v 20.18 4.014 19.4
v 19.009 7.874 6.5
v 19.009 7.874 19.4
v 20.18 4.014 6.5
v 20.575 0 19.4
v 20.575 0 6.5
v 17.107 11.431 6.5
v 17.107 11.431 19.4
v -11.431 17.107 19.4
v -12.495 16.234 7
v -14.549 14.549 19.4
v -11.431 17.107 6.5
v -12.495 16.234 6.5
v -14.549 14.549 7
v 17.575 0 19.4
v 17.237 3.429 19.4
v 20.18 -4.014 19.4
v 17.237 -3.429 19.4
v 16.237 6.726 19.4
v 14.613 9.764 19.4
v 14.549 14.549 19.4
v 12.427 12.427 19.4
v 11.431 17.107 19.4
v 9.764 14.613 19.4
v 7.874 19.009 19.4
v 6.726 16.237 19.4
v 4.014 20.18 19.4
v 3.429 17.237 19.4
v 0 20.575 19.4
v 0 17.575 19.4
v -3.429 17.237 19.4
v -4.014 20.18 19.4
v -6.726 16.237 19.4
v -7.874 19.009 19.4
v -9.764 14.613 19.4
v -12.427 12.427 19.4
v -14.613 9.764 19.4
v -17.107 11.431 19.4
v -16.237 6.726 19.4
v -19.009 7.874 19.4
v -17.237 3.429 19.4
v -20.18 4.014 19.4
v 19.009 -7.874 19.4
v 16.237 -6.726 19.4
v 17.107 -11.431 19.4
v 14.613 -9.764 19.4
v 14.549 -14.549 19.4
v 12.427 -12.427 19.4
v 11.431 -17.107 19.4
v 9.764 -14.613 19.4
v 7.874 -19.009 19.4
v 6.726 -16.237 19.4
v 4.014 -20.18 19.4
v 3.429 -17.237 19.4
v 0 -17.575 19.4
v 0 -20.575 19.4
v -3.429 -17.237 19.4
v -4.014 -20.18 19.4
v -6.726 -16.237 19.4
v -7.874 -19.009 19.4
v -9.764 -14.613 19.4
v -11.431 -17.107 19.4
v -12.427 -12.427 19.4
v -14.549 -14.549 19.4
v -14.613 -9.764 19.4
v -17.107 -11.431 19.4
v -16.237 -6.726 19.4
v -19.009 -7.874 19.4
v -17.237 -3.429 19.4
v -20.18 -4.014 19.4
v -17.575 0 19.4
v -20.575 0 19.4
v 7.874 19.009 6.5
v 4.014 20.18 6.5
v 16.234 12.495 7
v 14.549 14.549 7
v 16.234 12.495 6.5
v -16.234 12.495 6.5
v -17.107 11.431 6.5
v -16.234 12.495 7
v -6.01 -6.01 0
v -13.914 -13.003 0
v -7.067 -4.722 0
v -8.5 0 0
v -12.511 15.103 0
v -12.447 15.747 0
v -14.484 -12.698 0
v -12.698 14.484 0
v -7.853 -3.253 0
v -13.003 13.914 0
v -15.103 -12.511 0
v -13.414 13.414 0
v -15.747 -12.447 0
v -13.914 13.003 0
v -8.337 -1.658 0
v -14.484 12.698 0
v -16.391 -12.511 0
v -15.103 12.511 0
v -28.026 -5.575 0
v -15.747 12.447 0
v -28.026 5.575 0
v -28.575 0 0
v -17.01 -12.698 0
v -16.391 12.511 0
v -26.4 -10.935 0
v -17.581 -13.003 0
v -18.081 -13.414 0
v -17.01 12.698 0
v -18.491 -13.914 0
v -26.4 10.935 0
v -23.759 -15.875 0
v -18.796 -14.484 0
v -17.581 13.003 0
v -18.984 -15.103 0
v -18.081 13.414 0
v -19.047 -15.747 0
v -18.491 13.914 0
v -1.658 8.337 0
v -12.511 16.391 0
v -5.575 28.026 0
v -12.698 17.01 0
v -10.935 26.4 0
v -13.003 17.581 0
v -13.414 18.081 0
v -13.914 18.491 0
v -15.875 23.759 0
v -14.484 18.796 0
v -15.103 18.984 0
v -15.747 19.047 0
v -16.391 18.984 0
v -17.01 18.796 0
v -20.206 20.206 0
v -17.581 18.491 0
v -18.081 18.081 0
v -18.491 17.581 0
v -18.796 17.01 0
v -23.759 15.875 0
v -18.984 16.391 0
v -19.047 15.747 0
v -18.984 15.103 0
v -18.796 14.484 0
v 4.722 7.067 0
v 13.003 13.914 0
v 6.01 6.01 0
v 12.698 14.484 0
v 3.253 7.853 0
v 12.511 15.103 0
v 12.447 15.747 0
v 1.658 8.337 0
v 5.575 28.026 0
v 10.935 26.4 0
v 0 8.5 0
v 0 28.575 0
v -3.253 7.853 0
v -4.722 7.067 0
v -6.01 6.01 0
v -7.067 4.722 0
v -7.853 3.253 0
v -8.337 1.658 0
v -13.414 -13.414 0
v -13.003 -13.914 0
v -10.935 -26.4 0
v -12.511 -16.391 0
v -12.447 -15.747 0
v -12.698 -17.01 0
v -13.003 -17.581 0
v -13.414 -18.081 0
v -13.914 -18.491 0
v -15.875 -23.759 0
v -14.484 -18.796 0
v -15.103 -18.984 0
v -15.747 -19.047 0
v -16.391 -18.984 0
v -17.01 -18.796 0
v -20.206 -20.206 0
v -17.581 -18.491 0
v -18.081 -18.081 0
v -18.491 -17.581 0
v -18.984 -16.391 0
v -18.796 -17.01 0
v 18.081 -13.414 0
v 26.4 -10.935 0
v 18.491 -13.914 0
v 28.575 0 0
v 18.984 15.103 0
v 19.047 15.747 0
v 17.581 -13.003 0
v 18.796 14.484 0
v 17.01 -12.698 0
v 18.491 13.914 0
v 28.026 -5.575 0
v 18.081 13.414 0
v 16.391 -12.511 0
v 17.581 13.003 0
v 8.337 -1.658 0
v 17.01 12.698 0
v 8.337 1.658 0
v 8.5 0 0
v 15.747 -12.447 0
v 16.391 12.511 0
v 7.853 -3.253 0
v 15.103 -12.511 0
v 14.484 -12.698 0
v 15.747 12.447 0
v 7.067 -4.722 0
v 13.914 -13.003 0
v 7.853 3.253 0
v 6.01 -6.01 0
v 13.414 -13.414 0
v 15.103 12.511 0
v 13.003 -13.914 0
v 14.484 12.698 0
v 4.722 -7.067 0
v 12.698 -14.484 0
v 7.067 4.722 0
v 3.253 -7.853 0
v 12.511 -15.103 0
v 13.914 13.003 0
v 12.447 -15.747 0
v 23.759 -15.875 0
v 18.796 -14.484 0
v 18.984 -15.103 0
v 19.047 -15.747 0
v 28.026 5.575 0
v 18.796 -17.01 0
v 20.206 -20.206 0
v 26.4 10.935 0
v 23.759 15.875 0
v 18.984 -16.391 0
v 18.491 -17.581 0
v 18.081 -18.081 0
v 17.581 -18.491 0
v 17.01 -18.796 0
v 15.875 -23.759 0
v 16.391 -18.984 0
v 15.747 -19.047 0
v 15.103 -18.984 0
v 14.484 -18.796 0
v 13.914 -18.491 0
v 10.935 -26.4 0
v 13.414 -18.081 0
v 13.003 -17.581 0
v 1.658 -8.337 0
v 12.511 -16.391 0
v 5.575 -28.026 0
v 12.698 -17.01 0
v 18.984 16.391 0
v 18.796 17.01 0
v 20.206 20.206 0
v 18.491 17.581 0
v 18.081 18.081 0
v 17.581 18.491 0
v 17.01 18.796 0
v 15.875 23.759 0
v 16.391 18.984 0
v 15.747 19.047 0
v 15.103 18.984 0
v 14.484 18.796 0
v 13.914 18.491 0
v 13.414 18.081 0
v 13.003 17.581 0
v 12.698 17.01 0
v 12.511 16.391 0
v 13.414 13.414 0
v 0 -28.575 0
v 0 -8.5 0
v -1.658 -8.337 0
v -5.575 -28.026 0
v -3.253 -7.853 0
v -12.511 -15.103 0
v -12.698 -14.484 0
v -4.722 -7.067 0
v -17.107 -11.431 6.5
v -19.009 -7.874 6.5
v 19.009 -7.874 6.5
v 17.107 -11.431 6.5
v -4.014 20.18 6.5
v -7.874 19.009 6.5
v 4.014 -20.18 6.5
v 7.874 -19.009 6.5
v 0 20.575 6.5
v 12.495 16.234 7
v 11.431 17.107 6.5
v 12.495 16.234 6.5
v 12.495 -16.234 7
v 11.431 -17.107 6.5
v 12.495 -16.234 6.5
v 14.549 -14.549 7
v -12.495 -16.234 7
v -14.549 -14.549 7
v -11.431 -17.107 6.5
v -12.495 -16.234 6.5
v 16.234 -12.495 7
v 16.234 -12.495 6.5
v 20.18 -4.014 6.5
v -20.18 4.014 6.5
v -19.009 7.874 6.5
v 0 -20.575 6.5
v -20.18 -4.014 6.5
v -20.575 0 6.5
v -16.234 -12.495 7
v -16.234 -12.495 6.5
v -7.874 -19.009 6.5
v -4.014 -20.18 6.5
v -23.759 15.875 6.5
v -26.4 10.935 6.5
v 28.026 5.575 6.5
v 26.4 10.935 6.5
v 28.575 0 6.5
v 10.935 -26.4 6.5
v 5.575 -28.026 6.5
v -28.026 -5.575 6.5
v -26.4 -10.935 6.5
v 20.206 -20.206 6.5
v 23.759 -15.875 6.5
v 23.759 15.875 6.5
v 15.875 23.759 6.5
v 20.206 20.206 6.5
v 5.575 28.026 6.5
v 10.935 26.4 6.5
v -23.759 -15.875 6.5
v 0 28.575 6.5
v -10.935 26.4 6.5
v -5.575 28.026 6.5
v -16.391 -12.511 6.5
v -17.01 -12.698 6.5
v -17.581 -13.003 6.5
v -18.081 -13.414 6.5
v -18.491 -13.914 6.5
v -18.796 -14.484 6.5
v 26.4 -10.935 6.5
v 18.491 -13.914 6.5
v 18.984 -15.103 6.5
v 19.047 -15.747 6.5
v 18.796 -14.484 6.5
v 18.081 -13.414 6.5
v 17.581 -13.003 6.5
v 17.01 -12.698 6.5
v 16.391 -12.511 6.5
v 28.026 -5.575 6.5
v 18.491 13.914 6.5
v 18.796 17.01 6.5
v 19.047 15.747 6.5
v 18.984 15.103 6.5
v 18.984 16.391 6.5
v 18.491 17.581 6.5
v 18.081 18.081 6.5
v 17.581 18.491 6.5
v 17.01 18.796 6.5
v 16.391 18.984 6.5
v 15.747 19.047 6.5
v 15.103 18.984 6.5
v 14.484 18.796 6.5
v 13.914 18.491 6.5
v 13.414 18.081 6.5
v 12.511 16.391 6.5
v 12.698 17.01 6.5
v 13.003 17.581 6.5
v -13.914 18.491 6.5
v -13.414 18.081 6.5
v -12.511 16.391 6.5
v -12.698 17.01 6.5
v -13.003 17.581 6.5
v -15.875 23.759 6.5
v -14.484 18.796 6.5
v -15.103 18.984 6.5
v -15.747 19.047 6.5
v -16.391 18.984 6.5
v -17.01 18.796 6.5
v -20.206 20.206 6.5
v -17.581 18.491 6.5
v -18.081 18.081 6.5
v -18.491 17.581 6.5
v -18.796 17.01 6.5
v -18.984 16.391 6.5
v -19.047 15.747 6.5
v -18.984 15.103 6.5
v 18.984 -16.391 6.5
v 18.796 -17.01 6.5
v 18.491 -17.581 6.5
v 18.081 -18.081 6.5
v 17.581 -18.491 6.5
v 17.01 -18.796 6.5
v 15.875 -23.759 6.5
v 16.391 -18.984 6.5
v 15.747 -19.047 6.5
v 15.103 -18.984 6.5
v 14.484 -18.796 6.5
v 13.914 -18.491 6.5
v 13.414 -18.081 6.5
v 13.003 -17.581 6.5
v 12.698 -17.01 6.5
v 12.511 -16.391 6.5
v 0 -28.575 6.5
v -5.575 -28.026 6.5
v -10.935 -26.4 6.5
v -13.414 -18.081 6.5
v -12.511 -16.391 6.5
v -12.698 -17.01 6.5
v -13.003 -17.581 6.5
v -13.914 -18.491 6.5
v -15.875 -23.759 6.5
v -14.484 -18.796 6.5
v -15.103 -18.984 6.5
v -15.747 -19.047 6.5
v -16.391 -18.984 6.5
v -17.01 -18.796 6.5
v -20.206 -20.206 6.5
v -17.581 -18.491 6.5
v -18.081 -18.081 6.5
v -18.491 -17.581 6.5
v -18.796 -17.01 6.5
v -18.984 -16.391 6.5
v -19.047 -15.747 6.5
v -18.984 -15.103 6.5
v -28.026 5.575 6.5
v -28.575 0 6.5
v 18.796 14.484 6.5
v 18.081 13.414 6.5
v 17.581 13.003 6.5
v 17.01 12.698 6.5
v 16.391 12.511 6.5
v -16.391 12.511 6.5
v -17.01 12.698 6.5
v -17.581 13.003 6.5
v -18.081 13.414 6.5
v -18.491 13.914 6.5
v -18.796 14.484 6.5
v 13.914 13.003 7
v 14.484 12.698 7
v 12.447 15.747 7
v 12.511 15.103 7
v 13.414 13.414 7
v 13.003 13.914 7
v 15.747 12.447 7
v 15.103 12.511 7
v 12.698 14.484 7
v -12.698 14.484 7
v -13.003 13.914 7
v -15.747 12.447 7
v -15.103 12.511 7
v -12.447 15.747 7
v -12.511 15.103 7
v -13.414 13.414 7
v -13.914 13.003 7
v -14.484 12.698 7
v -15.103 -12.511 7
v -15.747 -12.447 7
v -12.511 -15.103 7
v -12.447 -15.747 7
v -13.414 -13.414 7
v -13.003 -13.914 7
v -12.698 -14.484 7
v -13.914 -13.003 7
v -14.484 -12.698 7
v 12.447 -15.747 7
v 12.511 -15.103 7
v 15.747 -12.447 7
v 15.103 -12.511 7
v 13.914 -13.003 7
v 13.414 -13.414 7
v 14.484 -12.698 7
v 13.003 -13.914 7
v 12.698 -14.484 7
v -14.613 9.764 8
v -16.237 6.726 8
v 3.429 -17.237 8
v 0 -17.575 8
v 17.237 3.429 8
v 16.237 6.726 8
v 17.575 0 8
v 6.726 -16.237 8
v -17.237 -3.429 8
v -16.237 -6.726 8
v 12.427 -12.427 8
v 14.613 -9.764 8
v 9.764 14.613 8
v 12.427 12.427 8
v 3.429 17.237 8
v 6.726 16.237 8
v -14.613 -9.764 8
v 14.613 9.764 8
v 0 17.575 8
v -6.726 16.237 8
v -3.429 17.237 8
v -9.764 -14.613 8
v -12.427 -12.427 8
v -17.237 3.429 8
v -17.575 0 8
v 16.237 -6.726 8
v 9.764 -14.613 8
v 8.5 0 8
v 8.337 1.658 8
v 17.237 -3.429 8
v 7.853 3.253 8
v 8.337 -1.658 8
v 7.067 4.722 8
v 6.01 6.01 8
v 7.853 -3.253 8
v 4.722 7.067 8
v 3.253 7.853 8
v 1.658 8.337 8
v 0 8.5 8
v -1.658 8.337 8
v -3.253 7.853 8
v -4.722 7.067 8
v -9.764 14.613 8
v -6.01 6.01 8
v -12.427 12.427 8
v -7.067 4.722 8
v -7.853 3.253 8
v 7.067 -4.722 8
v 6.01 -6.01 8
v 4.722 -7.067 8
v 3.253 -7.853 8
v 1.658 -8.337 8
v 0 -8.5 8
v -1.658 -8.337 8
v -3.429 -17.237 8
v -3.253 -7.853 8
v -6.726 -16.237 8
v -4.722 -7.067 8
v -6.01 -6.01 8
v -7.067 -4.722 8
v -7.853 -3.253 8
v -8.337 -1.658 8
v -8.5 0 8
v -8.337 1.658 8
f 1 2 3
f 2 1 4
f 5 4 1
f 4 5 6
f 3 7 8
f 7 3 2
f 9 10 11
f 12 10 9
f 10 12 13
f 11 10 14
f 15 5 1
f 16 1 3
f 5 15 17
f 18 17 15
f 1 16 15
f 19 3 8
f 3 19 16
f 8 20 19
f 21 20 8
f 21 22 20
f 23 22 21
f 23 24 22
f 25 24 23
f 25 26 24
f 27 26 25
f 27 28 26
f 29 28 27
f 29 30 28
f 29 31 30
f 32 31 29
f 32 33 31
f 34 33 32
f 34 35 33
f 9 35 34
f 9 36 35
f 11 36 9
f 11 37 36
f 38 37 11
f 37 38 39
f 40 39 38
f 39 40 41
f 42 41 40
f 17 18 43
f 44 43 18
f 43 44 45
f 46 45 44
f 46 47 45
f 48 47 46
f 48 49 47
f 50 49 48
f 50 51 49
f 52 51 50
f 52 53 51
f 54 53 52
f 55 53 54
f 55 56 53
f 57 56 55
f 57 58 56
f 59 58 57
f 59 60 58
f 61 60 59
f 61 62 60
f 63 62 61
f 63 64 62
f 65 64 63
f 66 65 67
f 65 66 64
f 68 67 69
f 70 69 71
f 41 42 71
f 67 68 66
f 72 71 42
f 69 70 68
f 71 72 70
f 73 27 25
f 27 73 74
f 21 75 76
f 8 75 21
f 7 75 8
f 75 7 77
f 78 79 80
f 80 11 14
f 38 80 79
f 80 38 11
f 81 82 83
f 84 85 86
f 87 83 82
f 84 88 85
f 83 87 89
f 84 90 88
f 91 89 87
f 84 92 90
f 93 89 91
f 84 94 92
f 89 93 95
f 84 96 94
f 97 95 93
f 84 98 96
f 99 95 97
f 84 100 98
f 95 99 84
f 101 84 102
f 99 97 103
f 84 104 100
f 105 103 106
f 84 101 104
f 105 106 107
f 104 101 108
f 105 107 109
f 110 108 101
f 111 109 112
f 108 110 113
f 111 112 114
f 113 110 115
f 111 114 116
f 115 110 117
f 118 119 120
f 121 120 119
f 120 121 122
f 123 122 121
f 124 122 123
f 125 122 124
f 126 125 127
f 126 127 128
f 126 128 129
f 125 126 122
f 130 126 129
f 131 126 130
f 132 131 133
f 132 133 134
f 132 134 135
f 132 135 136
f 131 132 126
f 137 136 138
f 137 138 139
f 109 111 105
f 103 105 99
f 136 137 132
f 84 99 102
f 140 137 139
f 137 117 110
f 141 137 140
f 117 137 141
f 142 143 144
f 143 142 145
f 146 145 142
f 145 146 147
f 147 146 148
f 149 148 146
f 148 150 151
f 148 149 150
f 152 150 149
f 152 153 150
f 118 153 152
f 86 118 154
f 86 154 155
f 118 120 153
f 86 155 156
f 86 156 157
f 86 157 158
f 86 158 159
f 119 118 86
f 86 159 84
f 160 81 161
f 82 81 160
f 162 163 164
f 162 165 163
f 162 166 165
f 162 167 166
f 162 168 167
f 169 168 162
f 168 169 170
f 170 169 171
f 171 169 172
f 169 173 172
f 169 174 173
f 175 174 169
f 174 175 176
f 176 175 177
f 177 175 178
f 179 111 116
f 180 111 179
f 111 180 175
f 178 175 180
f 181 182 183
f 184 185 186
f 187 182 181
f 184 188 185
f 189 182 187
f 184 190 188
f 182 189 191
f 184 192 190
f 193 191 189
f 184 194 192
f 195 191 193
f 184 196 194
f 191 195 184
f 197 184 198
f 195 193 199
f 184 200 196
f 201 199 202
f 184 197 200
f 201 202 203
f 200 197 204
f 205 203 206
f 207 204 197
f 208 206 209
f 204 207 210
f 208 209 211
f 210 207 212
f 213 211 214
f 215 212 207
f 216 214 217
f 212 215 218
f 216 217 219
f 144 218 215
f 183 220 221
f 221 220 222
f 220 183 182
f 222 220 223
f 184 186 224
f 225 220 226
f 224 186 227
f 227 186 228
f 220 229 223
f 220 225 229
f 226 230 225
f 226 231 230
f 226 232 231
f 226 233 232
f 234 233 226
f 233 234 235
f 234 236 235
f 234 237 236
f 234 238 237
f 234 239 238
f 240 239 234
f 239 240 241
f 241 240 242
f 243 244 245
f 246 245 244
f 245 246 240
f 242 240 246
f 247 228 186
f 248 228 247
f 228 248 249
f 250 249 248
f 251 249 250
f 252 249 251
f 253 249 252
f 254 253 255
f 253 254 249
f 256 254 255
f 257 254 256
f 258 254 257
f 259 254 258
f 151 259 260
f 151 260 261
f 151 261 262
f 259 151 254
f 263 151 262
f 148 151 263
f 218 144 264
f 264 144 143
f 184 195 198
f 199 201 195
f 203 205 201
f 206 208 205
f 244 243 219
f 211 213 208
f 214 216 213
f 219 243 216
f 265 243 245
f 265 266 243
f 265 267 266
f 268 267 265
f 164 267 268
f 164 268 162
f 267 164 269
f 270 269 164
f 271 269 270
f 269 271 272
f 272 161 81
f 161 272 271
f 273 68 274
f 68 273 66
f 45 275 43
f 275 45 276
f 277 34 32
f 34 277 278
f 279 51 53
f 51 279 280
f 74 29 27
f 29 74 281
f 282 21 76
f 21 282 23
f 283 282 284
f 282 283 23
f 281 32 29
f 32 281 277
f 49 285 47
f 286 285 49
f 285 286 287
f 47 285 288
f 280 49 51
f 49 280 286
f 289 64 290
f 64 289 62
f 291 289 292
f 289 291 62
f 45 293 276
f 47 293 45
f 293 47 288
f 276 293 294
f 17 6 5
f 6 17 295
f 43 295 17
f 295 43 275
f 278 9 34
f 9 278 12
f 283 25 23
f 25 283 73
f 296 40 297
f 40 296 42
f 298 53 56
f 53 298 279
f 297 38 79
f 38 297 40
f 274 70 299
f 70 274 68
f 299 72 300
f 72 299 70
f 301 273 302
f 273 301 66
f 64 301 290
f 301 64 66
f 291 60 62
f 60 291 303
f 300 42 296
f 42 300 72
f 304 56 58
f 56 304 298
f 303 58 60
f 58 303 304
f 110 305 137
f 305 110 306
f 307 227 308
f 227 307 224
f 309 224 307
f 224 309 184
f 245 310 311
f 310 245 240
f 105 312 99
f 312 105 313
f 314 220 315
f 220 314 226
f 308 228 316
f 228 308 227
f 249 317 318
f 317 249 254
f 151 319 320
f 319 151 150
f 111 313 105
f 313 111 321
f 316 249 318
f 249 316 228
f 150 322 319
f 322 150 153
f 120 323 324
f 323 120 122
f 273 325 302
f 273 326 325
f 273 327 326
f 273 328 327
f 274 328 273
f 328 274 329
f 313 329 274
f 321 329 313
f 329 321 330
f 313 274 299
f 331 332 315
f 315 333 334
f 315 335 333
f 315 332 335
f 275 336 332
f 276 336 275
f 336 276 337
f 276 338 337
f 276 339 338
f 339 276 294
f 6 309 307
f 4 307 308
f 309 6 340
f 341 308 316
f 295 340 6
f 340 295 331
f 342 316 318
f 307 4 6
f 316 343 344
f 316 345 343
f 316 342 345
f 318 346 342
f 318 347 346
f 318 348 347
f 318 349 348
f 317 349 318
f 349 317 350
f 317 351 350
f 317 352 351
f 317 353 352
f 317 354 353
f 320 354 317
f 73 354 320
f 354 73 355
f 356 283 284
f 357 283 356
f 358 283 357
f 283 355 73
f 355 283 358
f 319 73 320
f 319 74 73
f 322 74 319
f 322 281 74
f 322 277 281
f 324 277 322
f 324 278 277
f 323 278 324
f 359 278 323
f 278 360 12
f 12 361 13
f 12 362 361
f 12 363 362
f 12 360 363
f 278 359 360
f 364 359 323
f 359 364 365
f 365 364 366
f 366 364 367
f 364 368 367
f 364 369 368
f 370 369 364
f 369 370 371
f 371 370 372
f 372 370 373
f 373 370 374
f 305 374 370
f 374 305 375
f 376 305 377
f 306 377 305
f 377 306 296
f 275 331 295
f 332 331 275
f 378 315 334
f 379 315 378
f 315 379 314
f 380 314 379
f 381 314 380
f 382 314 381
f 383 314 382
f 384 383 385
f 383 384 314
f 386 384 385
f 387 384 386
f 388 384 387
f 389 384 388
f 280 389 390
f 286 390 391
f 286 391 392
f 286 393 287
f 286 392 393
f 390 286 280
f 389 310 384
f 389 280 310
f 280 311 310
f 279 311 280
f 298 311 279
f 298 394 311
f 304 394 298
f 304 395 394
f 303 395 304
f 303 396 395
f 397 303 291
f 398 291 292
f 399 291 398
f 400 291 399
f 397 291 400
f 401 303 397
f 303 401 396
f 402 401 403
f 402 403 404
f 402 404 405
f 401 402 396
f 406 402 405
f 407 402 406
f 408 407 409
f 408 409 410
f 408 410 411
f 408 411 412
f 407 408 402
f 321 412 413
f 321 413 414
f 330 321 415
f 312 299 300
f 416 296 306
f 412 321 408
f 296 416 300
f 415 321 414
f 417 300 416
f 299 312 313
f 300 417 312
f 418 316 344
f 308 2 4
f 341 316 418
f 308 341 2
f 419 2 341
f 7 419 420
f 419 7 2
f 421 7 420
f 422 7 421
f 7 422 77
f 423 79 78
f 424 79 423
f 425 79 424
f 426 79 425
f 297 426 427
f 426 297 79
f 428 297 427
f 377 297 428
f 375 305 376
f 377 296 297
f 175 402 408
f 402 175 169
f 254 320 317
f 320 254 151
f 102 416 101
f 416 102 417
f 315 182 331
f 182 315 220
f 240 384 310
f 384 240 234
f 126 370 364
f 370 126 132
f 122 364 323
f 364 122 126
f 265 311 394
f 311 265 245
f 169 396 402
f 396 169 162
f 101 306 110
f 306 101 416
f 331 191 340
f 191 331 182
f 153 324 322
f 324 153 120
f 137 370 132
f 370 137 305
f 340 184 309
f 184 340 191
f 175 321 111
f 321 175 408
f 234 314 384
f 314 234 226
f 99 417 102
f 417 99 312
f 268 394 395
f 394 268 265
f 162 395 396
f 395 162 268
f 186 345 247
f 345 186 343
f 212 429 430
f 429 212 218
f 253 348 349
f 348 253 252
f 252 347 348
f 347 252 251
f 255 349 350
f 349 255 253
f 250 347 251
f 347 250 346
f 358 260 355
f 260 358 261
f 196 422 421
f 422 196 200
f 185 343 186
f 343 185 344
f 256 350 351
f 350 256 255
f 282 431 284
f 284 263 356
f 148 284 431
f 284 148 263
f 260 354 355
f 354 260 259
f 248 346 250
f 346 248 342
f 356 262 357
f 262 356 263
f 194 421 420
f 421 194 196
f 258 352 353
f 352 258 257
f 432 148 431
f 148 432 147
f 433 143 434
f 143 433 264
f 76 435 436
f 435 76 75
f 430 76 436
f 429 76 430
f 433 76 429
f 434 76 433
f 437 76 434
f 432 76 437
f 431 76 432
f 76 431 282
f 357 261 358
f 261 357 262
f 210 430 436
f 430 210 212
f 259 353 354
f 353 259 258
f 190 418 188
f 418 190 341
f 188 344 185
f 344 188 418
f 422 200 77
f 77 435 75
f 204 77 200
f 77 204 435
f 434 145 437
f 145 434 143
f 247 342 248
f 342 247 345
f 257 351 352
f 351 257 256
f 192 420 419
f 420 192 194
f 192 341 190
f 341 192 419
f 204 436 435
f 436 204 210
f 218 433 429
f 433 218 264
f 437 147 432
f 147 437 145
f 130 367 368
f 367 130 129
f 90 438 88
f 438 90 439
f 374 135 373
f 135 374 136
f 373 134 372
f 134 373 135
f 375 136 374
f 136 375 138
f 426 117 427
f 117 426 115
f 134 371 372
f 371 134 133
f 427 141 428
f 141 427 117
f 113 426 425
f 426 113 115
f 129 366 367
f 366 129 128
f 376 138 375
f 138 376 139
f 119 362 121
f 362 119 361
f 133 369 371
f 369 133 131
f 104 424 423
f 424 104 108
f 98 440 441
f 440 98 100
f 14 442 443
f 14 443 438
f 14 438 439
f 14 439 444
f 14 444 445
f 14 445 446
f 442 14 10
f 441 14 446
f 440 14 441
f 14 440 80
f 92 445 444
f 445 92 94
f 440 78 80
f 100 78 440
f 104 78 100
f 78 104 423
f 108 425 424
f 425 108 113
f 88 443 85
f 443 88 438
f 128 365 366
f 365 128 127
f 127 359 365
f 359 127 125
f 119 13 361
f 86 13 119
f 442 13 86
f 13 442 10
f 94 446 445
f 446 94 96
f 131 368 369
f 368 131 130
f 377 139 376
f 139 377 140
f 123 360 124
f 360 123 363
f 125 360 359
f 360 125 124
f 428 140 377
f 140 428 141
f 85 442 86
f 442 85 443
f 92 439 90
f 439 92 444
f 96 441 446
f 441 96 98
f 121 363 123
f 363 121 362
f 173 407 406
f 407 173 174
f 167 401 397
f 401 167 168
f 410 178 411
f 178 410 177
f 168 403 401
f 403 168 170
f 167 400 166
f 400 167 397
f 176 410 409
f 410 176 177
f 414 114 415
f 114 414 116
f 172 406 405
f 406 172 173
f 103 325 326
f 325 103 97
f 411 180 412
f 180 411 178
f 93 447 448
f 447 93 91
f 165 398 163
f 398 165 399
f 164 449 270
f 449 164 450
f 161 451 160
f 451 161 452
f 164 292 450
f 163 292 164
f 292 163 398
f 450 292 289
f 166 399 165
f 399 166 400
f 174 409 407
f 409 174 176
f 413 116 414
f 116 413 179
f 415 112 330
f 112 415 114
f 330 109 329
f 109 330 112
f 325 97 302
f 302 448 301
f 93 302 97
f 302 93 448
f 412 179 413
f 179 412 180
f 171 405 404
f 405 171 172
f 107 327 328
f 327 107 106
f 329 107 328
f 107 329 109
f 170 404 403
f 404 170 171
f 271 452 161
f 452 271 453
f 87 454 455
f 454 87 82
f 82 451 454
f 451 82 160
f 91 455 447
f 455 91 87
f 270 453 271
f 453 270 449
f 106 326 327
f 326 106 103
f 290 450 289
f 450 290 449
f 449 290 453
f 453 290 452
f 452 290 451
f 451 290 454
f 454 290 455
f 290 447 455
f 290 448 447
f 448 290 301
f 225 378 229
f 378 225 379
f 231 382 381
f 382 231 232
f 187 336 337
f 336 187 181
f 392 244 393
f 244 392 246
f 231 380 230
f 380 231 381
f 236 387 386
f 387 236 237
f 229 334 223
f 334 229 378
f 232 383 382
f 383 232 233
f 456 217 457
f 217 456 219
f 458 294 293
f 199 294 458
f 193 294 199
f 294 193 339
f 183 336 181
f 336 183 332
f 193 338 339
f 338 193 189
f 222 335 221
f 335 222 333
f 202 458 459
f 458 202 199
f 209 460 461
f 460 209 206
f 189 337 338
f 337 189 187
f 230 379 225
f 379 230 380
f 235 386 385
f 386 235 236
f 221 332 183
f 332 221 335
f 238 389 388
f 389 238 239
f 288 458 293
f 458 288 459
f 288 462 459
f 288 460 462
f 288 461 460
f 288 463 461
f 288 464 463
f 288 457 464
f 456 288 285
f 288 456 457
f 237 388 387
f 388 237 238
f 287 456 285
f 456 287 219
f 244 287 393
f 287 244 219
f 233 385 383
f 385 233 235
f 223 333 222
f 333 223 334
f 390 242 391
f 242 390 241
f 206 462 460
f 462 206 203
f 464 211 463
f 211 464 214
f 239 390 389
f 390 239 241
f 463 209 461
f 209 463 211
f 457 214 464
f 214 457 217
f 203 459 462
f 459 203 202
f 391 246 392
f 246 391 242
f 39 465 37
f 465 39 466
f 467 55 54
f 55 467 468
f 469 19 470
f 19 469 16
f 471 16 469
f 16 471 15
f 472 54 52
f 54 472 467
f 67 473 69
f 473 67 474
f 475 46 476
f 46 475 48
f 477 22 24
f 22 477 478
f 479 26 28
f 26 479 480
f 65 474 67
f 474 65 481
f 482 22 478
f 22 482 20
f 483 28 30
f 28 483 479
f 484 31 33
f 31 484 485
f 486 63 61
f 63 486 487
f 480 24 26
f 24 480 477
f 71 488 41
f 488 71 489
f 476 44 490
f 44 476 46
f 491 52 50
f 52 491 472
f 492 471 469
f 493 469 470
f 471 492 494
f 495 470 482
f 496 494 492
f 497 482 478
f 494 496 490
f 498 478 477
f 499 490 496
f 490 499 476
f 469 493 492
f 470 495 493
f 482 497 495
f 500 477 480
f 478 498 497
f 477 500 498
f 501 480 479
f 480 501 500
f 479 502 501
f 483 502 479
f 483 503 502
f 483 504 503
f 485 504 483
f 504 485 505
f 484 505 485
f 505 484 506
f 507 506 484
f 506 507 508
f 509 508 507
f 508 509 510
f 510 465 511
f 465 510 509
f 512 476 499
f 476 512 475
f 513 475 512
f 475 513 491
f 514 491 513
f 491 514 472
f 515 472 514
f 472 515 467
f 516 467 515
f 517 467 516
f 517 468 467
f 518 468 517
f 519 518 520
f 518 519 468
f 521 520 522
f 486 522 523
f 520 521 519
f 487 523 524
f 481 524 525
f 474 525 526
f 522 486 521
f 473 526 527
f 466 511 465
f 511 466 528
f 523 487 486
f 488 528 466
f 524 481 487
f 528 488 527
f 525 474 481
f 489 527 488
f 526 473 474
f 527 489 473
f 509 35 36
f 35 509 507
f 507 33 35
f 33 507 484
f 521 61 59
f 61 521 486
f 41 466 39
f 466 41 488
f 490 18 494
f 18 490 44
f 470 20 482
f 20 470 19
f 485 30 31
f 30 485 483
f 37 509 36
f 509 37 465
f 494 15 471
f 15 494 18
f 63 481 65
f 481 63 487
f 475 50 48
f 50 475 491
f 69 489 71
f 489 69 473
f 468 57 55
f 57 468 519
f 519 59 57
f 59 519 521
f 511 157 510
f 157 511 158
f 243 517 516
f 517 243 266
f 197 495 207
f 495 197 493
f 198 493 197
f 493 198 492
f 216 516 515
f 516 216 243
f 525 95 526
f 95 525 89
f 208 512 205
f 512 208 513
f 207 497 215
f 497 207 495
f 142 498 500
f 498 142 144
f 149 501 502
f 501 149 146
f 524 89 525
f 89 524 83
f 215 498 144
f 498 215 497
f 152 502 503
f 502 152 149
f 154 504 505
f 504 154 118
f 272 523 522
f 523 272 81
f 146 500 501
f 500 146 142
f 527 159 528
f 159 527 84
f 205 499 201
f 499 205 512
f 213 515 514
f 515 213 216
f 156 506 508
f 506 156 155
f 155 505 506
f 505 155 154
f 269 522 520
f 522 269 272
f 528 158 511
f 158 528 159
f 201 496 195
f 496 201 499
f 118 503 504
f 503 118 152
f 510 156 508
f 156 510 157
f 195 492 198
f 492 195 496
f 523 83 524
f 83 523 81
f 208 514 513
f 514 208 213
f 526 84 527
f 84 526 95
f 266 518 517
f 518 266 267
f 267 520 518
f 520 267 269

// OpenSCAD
$fn = 32;

// ----------------------------------------------------------------------
// Bearing housing: seat for 6202 (35 x 11 mm), 41.15 mm body
// ----------------------------------------------------------------------

// --- parameters (mm) ---
body_od = 41.15;          // housing outside diameter
body_h = 19.4;            // overall housing height
wall = 3;                 // wall thickness
pocket_d = 35.15;         // 6202 seat, 0.15 mm clearance
seat_h = 11.4;            // pocket depth
shoulder = 3;             // shoulder under the bearing
pass_d = 17;              // shaft passage
flange_dia = 57.15;       // mounting flange diameter
flange_t = 5;             // flange thickness
bolt_d = 6.6;             // flange bolt clearance
bolt_r = 22.27;           // flange bolt circle radius

module body() {
  cylinder(h = body_h, d = body_od);
}

module flange() {
  /* flange sunk 1.5 mm into the body */
  cylinder(h = flange_t + 1.5, d = flange_dia);
}

difference() {
  union() {
    body();
    flange();
  }
  translate([0, 0, body_h - seat_h]) cylinder(h = seat_h + 1, d = pocket_d);
  translate([0, 0, -1]) cylinder(h = body_h - seat_h + 1, d = pass_d);
  for (i = [0 : 3]) rotate([0, 0, 45 + i * 90]) translate([bolt_r, 0, -1])
    cylinder(h = flange_t + 3, d = bolt_d);
}
